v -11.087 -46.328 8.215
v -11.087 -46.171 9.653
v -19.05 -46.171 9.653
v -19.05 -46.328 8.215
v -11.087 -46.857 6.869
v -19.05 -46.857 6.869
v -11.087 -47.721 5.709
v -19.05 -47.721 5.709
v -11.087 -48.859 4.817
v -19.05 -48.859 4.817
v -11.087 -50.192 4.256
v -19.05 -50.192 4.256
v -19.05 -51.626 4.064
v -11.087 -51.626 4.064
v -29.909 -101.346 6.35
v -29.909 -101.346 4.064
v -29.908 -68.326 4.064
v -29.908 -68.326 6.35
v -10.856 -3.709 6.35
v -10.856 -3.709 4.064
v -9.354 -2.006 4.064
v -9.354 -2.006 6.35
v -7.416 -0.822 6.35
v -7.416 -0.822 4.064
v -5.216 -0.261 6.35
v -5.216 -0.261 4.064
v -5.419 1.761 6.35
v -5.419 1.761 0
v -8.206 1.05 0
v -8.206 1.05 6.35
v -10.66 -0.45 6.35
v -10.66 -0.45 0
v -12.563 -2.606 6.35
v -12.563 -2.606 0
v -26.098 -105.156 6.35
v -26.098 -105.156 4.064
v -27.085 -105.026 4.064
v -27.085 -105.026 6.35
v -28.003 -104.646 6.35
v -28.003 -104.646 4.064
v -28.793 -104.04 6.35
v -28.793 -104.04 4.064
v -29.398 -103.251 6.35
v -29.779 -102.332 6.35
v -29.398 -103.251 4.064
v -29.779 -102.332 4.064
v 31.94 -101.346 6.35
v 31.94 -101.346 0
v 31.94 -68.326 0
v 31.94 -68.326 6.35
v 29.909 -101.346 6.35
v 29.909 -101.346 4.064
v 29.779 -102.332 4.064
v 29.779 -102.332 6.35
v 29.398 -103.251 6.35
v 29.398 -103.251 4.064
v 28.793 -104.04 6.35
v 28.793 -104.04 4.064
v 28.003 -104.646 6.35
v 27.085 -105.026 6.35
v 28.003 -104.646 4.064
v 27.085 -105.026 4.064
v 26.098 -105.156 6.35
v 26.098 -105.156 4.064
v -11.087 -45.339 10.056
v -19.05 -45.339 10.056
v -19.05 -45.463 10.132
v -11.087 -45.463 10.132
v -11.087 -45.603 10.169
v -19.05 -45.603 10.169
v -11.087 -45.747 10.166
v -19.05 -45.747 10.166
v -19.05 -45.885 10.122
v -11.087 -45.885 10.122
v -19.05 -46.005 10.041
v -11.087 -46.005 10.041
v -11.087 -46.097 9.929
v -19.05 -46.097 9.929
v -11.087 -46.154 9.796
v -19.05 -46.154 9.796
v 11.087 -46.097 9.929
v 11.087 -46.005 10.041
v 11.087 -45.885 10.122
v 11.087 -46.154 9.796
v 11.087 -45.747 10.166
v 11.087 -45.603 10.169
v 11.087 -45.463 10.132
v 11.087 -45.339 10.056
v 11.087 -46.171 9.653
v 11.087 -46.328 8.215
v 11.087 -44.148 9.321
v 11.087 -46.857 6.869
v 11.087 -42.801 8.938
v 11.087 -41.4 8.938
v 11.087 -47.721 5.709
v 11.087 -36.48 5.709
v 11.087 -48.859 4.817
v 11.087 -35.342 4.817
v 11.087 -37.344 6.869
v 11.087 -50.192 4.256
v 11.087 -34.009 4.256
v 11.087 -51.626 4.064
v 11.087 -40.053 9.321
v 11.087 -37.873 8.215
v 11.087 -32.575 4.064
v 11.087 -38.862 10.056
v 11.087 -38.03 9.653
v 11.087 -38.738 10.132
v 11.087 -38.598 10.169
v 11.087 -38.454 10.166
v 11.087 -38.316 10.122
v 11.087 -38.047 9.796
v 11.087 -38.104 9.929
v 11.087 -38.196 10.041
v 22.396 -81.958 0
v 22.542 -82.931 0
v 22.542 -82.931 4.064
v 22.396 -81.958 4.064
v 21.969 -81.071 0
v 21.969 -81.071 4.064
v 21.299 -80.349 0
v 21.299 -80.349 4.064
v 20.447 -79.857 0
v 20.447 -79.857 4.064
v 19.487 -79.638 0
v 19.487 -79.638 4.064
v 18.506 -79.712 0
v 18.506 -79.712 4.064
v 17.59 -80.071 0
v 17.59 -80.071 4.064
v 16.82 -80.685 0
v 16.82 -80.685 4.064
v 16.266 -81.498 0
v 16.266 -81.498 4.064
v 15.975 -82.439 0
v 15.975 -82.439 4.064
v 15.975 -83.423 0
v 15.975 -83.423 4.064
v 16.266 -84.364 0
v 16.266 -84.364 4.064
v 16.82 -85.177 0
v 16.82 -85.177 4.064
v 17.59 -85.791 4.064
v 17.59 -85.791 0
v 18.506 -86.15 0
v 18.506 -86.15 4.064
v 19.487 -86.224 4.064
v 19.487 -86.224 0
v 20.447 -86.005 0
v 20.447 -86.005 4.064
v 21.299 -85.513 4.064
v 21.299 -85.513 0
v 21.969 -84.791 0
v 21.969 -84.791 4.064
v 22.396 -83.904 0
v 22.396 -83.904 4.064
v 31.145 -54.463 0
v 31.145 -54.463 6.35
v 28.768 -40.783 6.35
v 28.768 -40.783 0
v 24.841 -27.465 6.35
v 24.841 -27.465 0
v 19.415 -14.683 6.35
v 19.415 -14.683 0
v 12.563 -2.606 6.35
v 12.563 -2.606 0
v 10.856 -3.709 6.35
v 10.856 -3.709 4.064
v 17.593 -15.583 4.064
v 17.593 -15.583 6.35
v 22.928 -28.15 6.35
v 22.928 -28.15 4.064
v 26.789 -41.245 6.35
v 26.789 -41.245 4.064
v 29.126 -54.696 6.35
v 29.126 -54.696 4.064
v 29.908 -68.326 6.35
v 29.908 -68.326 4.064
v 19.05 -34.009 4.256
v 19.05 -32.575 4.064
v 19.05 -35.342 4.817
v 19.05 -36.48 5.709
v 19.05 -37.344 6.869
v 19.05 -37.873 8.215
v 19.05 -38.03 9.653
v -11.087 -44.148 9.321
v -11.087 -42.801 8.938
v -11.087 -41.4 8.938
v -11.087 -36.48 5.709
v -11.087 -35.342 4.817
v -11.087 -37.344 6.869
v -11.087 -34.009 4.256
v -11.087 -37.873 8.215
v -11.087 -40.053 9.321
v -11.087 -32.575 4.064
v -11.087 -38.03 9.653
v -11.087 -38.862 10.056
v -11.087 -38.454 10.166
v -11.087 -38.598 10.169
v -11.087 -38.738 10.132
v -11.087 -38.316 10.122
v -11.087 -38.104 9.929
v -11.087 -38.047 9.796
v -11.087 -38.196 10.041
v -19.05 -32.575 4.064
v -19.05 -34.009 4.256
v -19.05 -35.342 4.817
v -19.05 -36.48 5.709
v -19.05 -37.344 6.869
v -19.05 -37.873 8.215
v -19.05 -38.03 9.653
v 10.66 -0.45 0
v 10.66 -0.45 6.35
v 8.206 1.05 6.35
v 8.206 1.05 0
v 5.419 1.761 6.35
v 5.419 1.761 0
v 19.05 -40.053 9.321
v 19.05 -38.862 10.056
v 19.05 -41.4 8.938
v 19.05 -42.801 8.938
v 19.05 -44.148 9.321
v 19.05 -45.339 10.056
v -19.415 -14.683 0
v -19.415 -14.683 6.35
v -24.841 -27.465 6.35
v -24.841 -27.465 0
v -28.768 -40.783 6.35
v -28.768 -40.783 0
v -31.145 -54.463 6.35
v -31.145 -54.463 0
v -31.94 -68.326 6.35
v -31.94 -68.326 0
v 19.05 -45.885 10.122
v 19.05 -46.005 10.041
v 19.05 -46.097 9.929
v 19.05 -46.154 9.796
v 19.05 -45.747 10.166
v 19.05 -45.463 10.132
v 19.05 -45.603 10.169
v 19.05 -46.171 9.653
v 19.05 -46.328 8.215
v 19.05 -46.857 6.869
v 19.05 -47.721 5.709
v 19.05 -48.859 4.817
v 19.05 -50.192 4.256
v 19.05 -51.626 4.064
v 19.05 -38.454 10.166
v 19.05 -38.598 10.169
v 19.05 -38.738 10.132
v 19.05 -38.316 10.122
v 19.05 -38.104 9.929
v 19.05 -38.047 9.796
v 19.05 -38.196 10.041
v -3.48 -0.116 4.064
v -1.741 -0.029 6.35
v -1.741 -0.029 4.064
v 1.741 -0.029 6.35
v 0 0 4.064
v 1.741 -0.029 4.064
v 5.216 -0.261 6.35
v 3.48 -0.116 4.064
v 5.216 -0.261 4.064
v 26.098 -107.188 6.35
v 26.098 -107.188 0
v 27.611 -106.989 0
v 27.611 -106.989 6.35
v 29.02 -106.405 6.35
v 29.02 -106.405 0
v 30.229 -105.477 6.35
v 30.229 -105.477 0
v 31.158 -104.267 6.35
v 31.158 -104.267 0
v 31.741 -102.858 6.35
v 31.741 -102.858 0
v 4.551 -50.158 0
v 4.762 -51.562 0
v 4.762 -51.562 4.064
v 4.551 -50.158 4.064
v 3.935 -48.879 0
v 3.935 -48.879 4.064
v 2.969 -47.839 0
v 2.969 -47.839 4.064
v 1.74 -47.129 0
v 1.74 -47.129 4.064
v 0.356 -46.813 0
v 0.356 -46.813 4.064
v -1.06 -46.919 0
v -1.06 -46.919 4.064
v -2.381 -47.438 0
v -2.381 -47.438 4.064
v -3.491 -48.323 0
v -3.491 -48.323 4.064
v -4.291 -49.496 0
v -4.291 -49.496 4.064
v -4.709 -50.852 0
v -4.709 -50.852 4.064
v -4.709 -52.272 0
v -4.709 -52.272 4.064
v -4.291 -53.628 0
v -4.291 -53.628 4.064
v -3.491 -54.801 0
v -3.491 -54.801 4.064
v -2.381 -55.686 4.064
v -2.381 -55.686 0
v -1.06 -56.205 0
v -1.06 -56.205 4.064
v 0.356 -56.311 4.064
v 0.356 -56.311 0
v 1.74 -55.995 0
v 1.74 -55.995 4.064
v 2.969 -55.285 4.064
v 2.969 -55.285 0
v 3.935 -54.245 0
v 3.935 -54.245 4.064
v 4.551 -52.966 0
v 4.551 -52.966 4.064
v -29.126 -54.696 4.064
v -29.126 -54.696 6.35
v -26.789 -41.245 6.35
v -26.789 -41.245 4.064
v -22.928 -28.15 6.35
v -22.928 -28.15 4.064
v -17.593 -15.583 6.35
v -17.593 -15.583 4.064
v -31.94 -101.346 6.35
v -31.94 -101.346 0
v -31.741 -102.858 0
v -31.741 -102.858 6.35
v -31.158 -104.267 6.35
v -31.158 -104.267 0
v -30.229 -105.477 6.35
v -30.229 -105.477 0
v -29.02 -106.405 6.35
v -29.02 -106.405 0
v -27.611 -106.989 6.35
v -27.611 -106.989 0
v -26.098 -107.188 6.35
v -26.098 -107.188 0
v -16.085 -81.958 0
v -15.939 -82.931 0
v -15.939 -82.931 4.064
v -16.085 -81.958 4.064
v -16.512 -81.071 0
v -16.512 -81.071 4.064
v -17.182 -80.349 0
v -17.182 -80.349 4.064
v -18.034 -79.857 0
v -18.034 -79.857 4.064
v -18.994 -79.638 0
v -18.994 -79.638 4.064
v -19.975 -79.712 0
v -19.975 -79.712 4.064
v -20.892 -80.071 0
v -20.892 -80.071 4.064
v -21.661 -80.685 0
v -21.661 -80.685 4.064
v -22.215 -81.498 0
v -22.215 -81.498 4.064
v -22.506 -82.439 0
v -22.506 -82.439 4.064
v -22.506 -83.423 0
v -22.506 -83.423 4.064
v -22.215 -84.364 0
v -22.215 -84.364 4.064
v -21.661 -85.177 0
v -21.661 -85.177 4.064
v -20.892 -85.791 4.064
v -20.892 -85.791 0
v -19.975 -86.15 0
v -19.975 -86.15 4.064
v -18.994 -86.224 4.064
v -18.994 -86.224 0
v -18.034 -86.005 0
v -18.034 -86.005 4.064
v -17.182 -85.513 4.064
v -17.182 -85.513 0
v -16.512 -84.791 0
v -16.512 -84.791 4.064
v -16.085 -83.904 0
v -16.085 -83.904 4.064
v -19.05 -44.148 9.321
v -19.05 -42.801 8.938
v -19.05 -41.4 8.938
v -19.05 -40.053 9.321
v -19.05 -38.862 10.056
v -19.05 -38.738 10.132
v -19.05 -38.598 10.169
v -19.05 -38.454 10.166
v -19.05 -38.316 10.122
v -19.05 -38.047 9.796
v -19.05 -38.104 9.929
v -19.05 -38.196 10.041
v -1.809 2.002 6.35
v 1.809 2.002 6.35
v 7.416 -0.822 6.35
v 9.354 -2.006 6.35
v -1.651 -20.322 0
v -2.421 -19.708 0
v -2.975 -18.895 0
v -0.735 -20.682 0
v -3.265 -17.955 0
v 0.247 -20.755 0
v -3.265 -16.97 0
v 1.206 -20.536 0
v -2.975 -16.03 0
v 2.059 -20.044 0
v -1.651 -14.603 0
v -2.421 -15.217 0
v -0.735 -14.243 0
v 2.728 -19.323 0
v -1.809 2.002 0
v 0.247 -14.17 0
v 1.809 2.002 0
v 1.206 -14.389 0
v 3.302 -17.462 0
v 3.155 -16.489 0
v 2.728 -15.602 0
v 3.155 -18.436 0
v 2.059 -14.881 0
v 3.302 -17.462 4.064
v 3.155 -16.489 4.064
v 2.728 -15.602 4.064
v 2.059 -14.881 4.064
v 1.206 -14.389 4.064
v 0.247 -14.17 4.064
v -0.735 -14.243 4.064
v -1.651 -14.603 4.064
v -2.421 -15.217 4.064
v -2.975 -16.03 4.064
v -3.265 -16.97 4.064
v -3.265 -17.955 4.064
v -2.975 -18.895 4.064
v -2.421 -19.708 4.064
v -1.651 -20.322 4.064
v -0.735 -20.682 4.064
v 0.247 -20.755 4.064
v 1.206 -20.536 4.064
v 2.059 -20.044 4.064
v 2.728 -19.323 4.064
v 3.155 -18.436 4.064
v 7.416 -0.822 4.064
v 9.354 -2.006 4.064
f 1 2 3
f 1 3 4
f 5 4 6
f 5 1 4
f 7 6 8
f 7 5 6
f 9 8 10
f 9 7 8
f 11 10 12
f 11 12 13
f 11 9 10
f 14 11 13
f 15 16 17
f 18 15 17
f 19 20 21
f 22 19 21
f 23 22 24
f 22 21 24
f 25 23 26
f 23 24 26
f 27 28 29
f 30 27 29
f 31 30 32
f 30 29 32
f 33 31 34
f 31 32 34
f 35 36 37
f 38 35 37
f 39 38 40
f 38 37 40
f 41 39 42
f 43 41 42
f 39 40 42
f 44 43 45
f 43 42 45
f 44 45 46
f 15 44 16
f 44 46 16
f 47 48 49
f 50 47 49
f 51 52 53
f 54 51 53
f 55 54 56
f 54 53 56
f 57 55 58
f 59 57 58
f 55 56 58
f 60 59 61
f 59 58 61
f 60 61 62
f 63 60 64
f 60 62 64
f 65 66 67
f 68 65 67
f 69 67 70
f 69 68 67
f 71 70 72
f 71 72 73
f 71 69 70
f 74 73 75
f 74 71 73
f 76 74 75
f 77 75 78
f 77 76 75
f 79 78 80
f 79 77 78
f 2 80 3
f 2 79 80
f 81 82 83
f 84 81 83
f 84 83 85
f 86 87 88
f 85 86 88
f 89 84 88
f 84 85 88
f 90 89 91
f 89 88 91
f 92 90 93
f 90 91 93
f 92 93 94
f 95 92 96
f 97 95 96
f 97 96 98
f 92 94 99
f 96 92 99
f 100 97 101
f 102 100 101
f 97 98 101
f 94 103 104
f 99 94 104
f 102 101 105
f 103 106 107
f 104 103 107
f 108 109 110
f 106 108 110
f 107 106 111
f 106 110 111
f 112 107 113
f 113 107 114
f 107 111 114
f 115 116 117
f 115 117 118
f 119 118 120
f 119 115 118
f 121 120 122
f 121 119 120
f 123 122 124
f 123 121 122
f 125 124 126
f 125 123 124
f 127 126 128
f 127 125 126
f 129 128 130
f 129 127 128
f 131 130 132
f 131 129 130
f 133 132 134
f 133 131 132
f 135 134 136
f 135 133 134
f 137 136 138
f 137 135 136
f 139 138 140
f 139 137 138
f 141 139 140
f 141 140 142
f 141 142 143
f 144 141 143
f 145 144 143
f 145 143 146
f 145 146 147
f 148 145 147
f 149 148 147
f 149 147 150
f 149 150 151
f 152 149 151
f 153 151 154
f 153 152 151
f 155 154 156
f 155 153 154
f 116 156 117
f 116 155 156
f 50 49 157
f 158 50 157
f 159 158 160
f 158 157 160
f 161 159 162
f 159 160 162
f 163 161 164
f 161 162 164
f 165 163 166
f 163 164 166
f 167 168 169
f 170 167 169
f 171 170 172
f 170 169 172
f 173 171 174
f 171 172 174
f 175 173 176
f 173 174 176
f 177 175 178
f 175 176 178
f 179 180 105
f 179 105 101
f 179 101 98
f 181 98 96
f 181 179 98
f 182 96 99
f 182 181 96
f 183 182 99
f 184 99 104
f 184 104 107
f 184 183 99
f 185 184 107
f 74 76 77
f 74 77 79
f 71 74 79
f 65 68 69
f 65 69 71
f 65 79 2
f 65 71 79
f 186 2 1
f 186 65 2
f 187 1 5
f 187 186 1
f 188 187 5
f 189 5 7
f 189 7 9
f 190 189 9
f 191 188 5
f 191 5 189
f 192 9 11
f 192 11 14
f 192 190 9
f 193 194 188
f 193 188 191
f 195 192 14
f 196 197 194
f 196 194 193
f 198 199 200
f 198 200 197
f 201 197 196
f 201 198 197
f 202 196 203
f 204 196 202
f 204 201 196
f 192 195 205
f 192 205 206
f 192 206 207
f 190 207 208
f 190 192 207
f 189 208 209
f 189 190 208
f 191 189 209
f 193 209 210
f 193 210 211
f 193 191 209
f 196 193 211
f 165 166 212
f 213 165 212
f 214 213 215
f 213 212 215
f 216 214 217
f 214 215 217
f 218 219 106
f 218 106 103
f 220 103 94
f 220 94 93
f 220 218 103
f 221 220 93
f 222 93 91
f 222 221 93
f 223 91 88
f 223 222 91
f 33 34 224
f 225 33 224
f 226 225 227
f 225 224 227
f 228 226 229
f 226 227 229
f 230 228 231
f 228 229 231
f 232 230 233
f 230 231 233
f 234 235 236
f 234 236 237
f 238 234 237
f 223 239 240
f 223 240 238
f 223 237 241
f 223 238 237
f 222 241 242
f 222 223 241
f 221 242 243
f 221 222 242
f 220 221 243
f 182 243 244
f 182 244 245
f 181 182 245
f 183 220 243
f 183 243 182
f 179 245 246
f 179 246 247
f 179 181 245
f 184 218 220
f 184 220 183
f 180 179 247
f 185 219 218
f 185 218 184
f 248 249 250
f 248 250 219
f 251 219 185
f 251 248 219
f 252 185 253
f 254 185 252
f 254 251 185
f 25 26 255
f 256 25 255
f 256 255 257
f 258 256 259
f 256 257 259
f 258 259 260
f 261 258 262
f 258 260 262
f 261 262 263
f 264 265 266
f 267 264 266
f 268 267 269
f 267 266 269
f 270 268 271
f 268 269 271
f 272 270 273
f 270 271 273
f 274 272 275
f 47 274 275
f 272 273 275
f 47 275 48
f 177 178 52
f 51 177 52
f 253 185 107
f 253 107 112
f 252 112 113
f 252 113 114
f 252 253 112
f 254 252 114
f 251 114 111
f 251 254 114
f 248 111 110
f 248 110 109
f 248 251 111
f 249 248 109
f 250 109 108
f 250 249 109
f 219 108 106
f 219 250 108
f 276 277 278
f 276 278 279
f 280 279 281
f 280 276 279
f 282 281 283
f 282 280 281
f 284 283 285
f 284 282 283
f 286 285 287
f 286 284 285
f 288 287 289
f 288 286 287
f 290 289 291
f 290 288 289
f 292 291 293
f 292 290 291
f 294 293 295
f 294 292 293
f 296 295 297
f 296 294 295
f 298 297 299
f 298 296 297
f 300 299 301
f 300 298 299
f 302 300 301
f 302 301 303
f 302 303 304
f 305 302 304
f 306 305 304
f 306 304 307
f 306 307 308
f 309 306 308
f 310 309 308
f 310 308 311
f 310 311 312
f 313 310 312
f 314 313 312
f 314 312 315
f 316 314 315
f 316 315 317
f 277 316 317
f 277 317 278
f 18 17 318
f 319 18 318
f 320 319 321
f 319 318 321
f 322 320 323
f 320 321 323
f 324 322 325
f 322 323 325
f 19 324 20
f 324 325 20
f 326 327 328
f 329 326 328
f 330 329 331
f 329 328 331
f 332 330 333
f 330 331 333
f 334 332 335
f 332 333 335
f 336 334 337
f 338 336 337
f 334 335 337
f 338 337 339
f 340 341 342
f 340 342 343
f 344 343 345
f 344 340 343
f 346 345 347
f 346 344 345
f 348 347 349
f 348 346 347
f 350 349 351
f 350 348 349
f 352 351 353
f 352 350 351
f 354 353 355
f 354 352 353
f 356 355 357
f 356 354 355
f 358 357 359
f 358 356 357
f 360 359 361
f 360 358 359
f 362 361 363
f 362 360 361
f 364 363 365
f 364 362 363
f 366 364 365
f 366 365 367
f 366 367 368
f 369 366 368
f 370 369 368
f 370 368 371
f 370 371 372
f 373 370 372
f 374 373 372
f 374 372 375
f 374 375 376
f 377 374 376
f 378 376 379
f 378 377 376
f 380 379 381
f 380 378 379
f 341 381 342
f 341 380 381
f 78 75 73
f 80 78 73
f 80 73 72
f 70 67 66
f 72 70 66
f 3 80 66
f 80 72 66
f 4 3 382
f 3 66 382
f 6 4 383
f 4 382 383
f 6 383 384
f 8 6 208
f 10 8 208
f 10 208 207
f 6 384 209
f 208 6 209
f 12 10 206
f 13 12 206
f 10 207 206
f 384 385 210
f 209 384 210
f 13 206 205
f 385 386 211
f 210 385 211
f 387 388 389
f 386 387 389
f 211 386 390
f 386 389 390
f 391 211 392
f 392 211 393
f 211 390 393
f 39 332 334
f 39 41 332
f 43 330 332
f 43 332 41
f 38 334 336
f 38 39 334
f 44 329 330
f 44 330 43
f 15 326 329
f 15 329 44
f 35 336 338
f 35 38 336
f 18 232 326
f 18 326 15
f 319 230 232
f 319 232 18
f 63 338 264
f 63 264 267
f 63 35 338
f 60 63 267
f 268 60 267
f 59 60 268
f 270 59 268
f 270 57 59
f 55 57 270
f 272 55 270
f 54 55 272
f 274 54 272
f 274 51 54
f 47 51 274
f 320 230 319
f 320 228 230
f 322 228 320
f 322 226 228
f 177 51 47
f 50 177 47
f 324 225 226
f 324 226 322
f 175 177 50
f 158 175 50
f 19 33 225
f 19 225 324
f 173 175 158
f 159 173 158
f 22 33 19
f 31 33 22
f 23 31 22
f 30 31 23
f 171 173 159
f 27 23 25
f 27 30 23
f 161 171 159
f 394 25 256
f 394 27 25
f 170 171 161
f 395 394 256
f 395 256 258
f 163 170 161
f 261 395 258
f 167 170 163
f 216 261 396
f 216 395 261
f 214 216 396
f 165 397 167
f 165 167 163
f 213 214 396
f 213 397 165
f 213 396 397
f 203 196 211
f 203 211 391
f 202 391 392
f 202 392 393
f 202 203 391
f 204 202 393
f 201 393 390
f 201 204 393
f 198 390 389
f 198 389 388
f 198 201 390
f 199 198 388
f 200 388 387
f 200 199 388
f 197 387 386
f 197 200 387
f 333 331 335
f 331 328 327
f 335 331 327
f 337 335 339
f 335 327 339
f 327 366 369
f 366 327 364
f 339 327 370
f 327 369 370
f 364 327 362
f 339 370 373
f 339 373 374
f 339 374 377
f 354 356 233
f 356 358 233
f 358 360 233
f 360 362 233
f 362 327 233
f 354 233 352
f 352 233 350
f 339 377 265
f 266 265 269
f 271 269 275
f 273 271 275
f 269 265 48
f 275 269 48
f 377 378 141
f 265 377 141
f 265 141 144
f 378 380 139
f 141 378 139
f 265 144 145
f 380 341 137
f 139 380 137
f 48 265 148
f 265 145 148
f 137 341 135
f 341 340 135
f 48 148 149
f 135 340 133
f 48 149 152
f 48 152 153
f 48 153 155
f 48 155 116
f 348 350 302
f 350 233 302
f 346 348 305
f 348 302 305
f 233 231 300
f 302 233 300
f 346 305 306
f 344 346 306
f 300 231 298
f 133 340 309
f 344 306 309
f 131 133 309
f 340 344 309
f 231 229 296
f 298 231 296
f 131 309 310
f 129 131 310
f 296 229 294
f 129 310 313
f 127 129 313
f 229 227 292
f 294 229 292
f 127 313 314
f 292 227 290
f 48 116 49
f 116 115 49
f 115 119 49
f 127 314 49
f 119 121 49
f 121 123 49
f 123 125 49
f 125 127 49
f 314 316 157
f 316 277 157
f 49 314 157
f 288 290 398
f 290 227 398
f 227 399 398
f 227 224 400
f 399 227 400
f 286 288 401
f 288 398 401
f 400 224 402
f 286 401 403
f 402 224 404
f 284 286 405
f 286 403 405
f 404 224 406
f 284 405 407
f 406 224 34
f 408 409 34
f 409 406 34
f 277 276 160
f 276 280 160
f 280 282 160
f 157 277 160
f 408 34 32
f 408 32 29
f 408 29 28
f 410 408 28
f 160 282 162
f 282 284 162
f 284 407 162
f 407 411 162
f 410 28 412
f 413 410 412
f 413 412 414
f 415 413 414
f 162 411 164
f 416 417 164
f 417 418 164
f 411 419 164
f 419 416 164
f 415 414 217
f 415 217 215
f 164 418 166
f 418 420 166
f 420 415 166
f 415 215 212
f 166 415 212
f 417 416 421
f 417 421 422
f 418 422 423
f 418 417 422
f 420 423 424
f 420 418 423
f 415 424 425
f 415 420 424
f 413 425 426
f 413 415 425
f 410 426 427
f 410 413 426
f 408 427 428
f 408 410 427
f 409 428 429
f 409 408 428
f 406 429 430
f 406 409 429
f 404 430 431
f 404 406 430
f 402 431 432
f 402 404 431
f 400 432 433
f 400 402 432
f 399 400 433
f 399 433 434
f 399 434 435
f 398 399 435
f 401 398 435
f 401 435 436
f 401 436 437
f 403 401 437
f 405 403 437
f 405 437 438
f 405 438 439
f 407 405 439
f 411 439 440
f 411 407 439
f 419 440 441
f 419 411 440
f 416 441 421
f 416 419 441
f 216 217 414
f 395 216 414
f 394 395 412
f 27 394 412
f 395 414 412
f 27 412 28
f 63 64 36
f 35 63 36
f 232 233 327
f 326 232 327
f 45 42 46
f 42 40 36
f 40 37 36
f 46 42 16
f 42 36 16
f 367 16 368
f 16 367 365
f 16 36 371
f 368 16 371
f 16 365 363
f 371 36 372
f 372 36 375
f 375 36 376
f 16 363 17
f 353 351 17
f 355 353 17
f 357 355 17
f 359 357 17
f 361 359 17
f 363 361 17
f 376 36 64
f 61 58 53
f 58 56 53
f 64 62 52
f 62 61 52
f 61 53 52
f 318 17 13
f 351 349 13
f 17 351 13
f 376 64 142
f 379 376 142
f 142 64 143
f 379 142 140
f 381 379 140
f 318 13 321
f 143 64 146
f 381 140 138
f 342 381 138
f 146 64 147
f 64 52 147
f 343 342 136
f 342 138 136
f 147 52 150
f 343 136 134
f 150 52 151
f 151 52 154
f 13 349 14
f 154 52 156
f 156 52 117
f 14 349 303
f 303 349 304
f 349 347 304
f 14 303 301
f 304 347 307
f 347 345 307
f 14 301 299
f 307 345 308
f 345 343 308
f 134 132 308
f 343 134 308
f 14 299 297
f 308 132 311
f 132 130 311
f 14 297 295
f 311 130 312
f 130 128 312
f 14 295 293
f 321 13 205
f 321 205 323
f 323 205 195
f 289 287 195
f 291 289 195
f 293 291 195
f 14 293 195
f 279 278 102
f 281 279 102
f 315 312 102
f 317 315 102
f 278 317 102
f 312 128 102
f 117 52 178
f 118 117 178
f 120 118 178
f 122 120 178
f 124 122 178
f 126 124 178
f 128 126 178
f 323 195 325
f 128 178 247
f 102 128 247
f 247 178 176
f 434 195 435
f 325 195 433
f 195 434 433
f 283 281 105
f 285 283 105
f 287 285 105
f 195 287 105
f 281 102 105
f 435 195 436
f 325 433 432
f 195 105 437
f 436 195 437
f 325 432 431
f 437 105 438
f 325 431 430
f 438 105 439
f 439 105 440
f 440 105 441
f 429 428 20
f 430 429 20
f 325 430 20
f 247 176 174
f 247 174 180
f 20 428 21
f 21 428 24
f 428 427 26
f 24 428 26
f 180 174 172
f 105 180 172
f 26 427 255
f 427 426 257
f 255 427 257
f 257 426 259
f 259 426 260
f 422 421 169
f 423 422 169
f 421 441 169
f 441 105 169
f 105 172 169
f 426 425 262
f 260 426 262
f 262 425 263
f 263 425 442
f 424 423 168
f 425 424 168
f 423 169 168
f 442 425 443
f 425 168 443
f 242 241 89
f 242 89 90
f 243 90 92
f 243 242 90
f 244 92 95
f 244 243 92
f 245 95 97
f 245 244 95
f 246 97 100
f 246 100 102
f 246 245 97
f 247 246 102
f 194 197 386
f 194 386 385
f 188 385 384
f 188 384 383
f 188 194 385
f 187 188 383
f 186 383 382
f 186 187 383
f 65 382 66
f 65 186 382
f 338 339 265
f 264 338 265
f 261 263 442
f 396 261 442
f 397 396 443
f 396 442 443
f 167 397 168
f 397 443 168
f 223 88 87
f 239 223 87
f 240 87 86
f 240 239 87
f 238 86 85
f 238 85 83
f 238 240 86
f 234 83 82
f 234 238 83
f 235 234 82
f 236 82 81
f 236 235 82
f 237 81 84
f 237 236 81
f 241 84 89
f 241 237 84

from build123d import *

# Parameters (mm, degrees)
F0_R     = 3.302
F0_R_2   = 4.7625
F1_DEPTH = 4.064
F3_DEPTH = 19.05
F4_DEPTH = 11.0871
F6_DEPTH = 6.35


with BuildPart() as f1:
    # F0 (on Top) → F1 (new body)
    with BuildSketch(Plane.XY):
        with BuildLine():
            ThreePointArc((-10.8559225607, -3.7088047495), (-25.0461002864, -34.6422404521), (-29.9085, -68.326))
            Line((-29.9085, -68.326), (-29.9085, -101.346))
            ThreePointArc((-29.9085, -101.346), (-28.7925768363, -104.0400768363), (-26.0985, -105.156))
            Line((-26.0985, -105.156), (0, -105.156))
            Line((0, -105.156), (26.0985, -105.156))
            ThreePointArc((26.0985, -105.156), (28.7925768363, -104.0400768363), (29.9085, -101.346))
            Line((29.9085, -101.346), (29.9085, -68.326))
            ThreePointArc((29.9085, -68.326), (25.0461002864, -34.6422404521), (10.8559225607, -3.7088047495))
            ThreePointArc((10.8559225607, -3.7088047495), (8.4291493536, -1.3414386781), (5.215684606, -0.2610245767))
            ThreePointArc((5.215684606, -0.2610245767), (2.6111060749, -0.0652969534), (0, 0))
            ThreePointArc((0, 0), (-2.6111060749, -0.0652969534), (-5.215684606, -0.2610245767))
            ThreePointArc((-5.215684606, -0.2610245767), (-8.4291493536, -1.3414386781), (-10.8559225607, -3.7088047495))
        make_face()
        with Locations((-19.2405, -82.931)):
            Circle(F0_R, mode=Mode.SUBTRACT)
        with Locations((19.2405, -82.931)):
            Circle(F0_R, mode=Mode.SUBTRACT)
        with Locations((0, -51.562)):
            Circle(F0_R_2, mode=Mode.SUBTRACT)
        with Locations((0, -17.4625)):
            Circle(F0_R, mode=Mode.SUBTRACT)
    extrude(amount=F1_DEPTH)

    # F2 (on Right) → F3 (join, symmetric)
    with BuildSketch(Plane.YZ):
        with BuildLine():
            Line((-51.6255, 4.064), (-32.5755, 4.064))
            ThreePointArc((-32.5755, 4.064), (-36.4801215826, 5.7092093226), (-38.0299678542, 9.6526545109))
            ThreePointArc((-38.0299678542, 9.6526545109), (-38.3159932296, 10.1220079213), (-38.8616980577, 10.0563620532))
            ThreePointArc((-38.8616980577, 10.0563620532), (-42.1005, 8.89), (-45.3393019423, 10.0563620532))
            ThreePointArc((-45.3393019423, 10.0563620532), (-45.8850067704, 10.1220079213), (-46.1710321458, 9.6526545109))
            ThreePointArc((-46.1710321458, 9.6526545109), (-47.7208784174, 5.7092093226), (-51.6255, 4.064))
        make_face()
    extrude(amount=F3_DEPTH, both=True)

    # F2 (on Right) → F4 (cut, symmetric)
    with BuildSketch(Plane.YZ):
        with BuildLine():
            Line((-51.6255, 4.064), (-32.5755, 4.064))
            ThreePointArc((-32.5755, 4.064), (-36.4801215826, 5.7092093226), (-38.0299678542, 9.6526545109))
            ThreePointArc((-38.0299678542, 9.6526545109), (-38.3159932296, 10.1220079213), (-38.8616980577, 10.0563620532))
            ThreePointArc((-38.8616980577, 10.0563620532), (-42.1005, 8.89), (-45.3393019423, 10.0563620532))
            ThreePointArc((-45.3393019423, 10.0563620532), (-45.8850067704, 10.1220079213), (-46.1710321458, 9.6526545109))
            ThreePointArc((-46.1710321458, 9.6526545109), (-47.7208784174, 5.7092093226), (-51.6255, 4.064))
        make_face()
    extrude(amount=F4_DEPTH, both=True, mode=Mode.SUBTRACT)

    # F5 (on Top) → F6 (join)
    with BuildSketch(Plane.XY):
        with BuildLine():
            ThreePointArc((5.4185637479, 1.7608221173), (0, 2.032), (-5.4185637479, 1.7608221173))
            ThreePointArc((-5.4185637479, 1.7608221173), (-9.4889524281, 0.3922975888), (-12.5628651572, -2.6063661016))
            ThreePointArc((-12.5628651572, -2.6063661016), (-26.9951425328, -34.067559391), (-31.9405, -68.326))
            Line((-31.9405, -68.326), (-31.9405, -101.346))
            ThreePointArc((-31.9405, -101.346), (-30.2294178157, -105.4769178157), (-26.0985, -107.188))
            Line((-26.0985, -107.188), (26.0985, -107.188))
            ThreePointArc((26.0985, -107.188), (30.2294178157, -105.4769178157), (31.9405, -101.346))
            Line((31.9405, -101.346), (31.9405, -68.326))
            ThreePointArc((31.9405, -68.326), (26.9951425328, -34.067559391), (12.5628651572, -2.6063661016))
            ThreePointArc((12.5628651572, -2.6063661016), (9.4889524281, 0.3922975888), (5.4185637479, 1.7608221173))
        make_face()
        with BuildLine():
            ThreePointArc((-29.9085, -68.326), (-25.0461002864, -34.6422404521), (-10.8559225607, -3.7088047495))
            ThreePointArc((-10.8559225607, -3.7088047495), (-8.4291493536, -1.3414386781), (-5.215684606, -0.2610245767))
            ThreePointArc((-5.215684606, -0.2610245767), (0, 0), (5.215684606, -0.2610245767))
            ThreePointArc((5.215684606, -0.2610245767), (8.4291493536, -1.3414386781), (10.8559225607, -3.7088047495))
            ThreePointArc((10.8559225607, -3.7088047495), (25.0461002864, -34.6422404521), (29.9085, -68.326))
            Line((29.9085, -68.326), (29.9085, -101.346))
            ThreePointArc((29.9085, -101.346), (28.7925768363, -104.0400768363), (26.0985, -105.156))
            Line((26.0985, -105.156), (-26.0985, -105.156))
            ThreePointArc((-26.0985, -105.156), (-28.7925768363, -104.0400768363), (-29.9085, -101.346))
            Line((-29.9085, -101.346), (-29.9085, -68.326))
        make_face(mode=Mode.SUBTRACT)
    extrude(amount=F6_DEPTH)


solid = f1.part
